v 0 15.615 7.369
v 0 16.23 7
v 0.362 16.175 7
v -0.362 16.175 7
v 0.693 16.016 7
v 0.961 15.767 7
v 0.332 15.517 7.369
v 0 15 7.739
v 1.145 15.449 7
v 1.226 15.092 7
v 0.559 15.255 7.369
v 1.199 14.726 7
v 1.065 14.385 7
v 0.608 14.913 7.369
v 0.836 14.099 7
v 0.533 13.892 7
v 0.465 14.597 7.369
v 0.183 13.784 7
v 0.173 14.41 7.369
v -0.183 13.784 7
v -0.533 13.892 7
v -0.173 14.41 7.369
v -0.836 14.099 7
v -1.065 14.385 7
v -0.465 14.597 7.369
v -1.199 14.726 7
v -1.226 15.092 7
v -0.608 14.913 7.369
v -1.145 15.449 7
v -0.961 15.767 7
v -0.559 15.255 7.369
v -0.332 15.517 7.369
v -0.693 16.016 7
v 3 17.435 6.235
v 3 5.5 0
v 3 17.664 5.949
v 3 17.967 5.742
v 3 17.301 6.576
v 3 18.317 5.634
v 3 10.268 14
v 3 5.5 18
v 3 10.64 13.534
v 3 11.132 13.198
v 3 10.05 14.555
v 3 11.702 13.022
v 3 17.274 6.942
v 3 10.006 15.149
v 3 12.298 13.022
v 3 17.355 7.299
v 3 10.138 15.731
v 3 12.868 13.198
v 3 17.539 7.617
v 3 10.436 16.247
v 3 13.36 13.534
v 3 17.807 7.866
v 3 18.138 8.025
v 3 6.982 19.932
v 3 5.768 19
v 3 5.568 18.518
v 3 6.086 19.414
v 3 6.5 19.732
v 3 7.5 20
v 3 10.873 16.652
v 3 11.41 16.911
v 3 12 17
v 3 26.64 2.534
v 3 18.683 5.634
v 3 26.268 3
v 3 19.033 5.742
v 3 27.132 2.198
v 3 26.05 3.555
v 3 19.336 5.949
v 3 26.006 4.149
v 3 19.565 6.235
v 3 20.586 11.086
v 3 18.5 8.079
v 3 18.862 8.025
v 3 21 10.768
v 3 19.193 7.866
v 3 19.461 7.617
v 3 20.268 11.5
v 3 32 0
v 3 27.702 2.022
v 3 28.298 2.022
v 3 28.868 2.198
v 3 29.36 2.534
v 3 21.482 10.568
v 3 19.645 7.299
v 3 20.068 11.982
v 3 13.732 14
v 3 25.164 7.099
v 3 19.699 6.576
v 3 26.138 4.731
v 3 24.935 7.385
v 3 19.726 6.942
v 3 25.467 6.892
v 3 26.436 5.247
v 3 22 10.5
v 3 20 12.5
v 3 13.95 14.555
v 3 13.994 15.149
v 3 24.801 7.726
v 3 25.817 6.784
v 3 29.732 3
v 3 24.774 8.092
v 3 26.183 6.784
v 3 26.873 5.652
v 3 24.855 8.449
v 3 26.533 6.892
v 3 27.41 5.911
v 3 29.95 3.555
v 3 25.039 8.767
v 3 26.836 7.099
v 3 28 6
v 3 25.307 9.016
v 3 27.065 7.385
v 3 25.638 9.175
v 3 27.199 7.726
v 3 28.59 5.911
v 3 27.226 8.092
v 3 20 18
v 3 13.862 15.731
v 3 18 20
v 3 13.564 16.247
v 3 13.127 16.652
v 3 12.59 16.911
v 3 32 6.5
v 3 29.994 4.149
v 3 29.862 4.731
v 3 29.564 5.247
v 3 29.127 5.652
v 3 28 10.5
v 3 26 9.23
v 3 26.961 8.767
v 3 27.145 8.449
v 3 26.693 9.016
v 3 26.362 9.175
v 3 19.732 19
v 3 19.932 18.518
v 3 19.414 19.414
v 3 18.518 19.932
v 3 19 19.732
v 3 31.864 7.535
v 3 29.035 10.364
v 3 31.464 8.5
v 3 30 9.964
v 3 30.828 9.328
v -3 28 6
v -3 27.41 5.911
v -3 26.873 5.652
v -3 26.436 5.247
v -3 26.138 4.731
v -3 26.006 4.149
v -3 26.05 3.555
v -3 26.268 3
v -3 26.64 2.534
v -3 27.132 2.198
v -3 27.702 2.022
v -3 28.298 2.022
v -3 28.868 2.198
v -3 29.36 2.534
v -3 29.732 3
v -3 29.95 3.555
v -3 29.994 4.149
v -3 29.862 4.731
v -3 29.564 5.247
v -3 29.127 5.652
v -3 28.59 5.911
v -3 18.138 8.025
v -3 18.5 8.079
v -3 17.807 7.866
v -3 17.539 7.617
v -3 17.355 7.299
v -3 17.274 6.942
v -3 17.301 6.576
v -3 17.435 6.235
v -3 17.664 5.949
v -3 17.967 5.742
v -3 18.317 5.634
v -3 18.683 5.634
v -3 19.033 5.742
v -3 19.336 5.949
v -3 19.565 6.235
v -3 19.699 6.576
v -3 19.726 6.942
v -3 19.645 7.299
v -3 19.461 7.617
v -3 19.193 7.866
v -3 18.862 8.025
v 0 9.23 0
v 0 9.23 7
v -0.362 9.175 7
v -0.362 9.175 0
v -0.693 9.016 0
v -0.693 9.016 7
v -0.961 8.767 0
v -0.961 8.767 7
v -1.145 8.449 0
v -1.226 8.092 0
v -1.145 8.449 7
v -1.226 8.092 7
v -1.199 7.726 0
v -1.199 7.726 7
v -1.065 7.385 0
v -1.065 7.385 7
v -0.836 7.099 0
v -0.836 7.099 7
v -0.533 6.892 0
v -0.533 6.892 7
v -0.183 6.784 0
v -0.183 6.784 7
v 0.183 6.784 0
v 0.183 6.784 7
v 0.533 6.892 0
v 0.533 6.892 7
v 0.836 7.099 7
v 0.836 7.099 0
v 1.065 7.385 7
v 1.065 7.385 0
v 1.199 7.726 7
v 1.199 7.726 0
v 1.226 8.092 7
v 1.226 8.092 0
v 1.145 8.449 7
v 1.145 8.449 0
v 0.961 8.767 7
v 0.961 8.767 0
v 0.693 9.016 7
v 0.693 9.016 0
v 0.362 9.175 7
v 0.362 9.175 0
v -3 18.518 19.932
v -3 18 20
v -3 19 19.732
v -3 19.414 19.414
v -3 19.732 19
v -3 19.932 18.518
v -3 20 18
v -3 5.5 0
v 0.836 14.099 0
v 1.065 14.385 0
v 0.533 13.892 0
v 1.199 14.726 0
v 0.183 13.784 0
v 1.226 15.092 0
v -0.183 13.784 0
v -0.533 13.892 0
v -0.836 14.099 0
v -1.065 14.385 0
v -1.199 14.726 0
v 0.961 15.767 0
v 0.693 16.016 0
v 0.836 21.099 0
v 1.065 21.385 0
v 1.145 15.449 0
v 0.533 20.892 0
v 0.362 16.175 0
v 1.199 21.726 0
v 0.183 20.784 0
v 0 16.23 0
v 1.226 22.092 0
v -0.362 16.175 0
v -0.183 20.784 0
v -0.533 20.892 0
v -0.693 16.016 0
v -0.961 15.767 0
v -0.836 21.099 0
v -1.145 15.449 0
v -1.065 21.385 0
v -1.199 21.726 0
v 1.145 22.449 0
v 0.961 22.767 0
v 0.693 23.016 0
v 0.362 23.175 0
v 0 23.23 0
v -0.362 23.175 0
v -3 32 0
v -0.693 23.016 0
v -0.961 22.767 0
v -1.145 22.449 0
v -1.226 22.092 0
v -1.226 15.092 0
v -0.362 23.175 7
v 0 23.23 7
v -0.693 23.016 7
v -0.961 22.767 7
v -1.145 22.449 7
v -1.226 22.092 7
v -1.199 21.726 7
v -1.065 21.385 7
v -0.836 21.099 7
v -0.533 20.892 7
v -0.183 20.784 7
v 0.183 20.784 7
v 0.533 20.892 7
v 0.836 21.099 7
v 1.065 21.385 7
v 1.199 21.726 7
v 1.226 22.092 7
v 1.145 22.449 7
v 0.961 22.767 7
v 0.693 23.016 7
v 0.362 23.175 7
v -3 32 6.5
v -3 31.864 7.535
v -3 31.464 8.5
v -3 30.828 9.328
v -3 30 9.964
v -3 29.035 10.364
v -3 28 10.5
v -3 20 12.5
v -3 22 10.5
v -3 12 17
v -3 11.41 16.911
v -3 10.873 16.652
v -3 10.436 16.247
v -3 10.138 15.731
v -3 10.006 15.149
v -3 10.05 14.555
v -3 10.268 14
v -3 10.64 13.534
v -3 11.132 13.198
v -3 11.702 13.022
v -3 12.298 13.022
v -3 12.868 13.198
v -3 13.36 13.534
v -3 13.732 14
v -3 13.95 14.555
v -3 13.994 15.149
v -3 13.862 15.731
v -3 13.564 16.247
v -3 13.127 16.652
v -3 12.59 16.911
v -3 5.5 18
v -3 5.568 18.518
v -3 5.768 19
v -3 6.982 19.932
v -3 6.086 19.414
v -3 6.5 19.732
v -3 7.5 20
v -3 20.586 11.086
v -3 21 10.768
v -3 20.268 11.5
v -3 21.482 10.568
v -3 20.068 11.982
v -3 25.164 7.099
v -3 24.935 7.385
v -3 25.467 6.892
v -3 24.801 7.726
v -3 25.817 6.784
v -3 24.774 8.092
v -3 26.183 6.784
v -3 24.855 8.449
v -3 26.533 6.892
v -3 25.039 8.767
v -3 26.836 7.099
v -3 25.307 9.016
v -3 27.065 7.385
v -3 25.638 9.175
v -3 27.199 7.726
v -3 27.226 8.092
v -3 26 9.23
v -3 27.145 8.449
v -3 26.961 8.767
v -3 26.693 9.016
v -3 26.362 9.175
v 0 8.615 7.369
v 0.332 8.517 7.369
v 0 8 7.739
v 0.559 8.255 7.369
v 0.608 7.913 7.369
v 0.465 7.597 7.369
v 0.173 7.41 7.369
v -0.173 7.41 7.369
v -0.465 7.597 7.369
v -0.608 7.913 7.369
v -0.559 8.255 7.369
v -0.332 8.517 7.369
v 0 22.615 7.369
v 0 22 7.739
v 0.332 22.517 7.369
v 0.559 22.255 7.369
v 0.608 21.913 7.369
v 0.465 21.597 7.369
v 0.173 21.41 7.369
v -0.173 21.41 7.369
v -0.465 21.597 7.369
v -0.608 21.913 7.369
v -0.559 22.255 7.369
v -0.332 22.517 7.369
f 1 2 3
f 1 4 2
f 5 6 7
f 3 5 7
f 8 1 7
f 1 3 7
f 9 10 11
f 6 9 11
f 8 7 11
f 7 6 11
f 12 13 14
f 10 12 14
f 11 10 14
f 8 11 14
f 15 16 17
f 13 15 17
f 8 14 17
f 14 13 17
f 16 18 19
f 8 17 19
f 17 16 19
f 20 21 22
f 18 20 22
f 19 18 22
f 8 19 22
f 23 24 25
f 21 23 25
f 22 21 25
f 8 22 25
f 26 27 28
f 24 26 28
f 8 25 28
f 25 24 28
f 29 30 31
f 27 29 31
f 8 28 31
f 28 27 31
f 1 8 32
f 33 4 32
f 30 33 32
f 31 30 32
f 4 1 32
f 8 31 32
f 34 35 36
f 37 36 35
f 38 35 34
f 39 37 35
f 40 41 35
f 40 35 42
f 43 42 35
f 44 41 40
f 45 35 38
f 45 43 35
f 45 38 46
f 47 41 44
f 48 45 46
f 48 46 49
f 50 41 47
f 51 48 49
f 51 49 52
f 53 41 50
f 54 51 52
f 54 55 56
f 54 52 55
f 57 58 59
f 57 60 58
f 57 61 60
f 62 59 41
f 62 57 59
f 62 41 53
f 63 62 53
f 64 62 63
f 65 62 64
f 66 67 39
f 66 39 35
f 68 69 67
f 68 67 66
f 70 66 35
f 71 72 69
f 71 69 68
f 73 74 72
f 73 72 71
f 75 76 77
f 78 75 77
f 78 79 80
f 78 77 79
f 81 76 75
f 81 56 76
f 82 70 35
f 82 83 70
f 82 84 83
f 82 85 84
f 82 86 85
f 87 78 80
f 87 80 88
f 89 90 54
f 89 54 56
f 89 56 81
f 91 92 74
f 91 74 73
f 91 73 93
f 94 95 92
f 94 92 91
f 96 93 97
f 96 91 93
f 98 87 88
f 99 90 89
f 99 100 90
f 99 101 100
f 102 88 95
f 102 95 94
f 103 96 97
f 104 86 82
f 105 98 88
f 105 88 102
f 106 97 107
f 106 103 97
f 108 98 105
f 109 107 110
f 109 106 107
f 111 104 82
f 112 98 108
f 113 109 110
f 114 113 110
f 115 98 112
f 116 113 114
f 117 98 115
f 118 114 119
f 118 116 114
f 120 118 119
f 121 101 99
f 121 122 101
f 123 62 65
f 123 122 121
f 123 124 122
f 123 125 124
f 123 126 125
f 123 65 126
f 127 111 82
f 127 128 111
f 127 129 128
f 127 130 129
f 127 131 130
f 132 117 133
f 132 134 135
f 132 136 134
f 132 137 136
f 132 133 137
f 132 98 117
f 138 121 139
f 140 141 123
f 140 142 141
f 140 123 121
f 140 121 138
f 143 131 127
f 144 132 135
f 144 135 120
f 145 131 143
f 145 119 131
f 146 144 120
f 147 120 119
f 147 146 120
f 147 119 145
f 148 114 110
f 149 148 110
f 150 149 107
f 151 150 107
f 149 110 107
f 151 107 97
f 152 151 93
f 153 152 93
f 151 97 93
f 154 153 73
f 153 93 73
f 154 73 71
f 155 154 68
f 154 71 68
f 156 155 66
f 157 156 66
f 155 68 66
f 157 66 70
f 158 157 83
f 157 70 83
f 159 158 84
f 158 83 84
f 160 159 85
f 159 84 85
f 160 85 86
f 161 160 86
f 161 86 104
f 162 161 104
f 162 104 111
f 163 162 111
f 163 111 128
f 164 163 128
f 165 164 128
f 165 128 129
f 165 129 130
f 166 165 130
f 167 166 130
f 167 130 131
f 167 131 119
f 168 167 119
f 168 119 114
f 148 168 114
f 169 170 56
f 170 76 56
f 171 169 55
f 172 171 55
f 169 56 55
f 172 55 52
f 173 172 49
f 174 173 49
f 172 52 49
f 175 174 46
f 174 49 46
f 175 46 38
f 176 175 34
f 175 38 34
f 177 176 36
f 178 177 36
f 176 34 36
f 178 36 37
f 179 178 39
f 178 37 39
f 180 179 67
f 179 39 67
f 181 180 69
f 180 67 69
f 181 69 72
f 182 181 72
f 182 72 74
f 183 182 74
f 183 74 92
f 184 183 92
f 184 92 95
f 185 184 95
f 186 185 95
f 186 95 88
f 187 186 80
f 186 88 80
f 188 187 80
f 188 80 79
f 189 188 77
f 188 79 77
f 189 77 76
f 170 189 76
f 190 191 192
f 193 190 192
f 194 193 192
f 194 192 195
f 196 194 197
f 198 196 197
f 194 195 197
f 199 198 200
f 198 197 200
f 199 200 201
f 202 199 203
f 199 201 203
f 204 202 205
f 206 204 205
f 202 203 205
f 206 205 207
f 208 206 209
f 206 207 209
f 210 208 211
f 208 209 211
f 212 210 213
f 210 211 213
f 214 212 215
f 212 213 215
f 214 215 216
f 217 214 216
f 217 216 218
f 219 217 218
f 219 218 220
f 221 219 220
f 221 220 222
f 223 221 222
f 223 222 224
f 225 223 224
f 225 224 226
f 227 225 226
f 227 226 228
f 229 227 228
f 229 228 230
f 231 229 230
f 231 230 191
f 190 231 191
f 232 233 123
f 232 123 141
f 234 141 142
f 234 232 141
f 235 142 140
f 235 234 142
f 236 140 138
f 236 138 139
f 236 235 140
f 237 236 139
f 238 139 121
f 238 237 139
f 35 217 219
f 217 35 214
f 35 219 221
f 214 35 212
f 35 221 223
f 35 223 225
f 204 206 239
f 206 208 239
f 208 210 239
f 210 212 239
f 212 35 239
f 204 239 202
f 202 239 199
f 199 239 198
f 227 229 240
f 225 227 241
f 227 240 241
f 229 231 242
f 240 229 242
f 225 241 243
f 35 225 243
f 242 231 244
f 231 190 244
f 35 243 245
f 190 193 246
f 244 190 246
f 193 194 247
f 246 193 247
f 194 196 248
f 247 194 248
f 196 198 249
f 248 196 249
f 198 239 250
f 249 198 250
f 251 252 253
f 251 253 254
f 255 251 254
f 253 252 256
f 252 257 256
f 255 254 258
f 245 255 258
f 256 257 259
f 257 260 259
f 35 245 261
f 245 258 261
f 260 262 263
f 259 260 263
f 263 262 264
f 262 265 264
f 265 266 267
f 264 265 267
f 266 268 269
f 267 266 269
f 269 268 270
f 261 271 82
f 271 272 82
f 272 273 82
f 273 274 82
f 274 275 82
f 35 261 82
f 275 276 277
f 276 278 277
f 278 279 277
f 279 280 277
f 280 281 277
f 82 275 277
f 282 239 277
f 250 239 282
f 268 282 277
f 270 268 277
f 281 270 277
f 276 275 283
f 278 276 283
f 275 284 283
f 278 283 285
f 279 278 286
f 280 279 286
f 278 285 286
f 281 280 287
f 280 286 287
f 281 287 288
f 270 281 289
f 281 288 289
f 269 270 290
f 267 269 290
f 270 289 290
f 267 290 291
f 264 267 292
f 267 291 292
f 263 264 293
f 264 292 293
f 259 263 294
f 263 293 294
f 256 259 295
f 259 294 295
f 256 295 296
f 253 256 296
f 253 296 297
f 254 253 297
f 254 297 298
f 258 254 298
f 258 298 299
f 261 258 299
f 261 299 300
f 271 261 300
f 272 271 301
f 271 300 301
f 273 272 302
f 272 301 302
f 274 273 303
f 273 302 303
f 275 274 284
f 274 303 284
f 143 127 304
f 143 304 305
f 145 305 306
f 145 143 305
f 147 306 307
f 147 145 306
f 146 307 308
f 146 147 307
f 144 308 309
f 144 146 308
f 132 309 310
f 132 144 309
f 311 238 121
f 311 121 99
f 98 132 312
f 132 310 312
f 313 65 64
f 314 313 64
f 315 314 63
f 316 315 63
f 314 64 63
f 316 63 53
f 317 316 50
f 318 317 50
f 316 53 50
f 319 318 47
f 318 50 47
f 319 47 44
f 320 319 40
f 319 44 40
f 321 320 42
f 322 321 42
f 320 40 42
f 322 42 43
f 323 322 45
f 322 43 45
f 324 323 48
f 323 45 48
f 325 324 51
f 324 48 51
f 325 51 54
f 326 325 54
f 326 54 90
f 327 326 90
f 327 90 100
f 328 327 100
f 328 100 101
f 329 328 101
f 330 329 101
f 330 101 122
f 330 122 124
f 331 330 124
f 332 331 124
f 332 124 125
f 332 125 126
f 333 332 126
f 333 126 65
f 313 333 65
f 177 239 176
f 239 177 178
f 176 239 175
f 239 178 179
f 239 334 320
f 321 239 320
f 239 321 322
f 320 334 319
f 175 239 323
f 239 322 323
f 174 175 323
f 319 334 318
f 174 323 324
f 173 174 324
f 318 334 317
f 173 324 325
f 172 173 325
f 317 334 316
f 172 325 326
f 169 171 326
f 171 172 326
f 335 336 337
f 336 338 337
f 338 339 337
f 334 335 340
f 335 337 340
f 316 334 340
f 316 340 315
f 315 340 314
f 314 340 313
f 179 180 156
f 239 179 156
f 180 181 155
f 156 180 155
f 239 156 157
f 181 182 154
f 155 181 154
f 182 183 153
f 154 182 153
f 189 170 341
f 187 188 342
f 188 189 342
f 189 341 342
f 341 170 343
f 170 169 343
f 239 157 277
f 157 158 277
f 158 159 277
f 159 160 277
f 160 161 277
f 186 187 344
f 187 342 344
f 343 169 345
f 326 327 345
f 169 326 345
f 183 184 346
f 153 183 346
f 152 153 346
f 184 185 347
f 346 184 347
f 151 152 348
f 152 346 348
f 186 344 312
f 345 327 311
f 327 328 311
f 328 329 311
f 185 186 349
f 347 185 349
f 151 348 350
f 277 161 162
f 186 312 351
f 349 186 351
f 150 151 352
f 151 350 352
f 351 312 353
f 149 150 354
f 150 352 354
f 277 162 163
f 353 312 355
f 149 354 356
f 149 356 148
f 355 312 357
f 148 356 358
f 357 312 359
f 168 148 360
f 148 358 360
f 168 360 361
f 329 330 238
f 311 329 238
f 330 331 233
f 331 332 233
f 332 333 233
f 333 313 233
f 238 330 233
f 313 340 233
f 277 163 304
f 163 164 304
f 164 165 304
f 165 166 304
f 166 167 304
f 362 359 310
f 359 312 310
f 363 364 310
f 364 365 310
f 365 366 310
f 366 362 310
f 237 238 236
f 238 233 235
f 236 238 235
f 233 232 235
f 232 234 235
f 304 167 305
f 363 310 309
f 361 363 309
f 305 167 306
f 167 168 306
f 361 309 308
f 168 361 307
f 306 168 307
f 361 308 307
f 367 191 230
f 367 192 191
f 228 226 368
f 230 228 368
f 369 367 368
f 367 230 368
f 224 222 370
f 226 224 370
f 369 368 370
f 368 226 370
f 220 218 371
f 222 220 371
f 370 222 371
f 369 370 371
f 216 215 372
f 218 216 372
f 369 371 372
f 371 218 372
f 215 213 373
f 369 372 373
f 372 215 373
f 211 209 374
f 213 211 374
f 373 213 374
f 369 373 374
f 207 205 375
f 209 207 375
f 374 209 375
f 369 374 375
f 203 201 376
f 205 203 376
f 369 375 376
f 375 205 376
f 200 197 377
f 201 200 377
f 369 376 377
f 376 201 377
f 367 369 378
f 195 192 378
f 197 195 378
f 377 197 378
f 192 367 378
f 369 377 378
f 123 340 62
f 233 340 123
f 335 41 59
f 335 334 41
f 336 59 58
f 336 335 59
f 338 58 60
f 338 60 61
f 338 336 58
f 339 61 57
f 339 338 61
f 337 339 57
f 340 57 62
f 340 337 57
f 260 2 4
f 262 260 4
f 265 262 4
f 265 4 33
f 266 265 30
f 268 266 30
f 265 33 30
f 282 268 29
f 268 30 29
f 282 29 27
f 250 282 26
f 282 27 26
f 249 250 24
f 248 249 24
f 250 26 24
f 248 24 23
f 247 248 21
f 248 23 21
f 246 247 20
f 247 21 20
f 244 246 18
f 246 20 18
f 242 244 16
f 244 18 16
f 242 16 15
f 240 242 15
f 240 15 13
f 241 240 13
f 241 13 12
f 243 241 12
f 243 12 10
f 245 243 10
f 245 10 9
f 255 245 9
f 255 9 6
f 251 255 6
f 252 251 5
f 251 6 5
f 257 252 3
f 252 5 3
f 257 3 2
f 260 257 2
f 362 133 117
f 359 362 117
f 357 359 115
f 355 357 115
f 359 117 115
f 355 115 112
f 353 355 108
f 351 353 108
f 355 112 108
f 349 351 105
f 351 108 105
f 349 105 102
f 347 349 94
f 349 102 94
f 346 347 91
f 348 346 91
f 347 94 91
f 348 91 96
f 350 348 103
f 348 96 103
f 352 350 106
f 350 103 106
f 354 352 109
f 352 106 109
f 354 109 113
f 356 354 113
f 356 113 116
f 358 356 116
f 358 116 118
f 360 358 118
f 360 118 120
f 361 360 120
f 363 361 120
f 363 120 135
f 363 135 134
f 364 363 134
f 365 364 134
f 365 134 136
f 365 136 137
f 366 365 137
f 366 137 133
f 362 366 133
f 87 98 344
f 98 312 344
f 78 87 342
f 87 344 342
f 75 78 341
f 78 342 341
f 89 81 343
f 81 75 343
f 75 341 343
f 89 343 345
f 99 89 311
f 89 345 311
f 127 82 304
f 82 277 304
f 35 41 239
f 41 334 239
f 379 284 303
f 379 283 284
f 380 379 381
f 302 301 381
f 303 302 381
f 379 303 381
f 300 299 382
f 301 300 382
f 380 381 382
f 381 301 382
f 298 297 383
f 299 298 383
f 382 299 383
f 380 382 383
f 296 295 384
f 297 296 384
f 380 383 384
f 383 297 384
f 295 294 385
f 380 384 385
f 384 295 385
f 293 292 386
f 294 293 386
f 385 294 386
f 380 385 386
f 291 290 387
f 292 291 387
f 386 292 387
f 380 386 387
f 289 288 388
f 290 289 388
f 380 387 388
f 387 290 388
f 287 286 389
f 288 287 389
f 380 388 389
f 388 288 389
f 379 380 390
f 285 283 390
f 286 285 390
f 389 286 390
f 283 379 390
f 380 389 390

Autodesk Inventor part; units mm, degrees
ref_plane "YZ Plane" through (0, 0, 0) normal (1, 0, 0) x (0, 1, 0)
ref_plane "XZ Plane" through (0, 0, 0) normal (0, 1, 0) x (-1, 0, 0)
ref_plane "XY Plane" through (0, 0, 0) normal (0, 0, 1) x (1, 0, 0)
sketch "Skizze1" plane through (0, 0, 0) normal (1, 0, 0) x (0, 1, 0)
  line L0 (5.5, 0) -> (32, 0)
  line L1 (32, 0) -> (32, 10.5)
  line L2 (5.5, 20) -> (5.5, 0)
  line L3 (5.5, 20) -> (20, 20)
  line L4 (20, 20) -> (20, 10.5)
  line L5 (32, 10.5) -> (20, 10.5)
  circle A0 centre (12, 15) radius 0.5
  circle A1 centre (28, 4) radius 0.5
  circle A2 centre (26, 8) radius 0.5
  line L6 (0, 24) -> (0, -4) projected
  line L7 (-6.4, 0) -> (38.4, 0) projected
  dimension "d1" = 10.5
  dimension "d3" = 20
  dimension "d21" = 1
  dimension "d28" = 1
  dimension "d31" = 4
  dimension "d41" = 1
  dimension "d43" = 8
  dimension "d54" = 5.5
  dimension "d55" = 26
  dimension "d56" = 28
  dimension "d61" = 15
  dimension "d62" = 12
  dimension "d127" = 32
  dimension "d128" = 14.5
extrude "Extrusion1" add sketch "Skizze1" along normal mid plane 6
sketch "Skizze9" plane through (-3, 0, 0) normal (-1, 0, 0) x (0, 0, 1)
  circle A0 centre (8, 26) radius 0.5 projected
  point P0 (0, 0)
hole "Feder" at (-3, 26, 8) direction (1, 0, 0) diameter 2.459 end through all thread size "M3x0.5" class "6H" standard "ISO Metric profile"
sketch "Skizze3" plane through (-3, 0, 0) normal (-1, 0, 0) x (0, 0, 1)
  circle A0 centre (4, 28) radius 0.5 projected
hole "Dribbler" at (-3, 28, 4) direction (1, 0, 0) diameter 4 end through all
sketch "Skizze4" plane through (-3, 0, 0) normal (-1, 0, 0) x (0, 0, 1)
  circle A0 centre (15, 12) radius 0.5 projected
  circle A1 centre (15, 12) radius 0.5 projected
  point P0 (0, 0)
hole "Chipper" at (-3, 12, 15) direction (1, 0, 0) diameter 4 end through all
sketch "Skizze5" plane through (3, 32, 0) normal (0, 0, -1) x (-1, 0, 0)
  line L0 (0, 0) -> (6, 0) projected
  line L1 (0, -26.5) -> (0, 0) projected
  line L2 (6, -26.5) -> (0, -26.5) projected
  line L3 (6, 0) -> (6, -26.5) projected
  line L4 (3, -26.5) -> (3, 0) construction
  point P0 (3, -10)
  point P1 (3, -24)
  point P2 (3, -17)
  point P3 (3, -13.25)
  dimension "d58" = 7
  dimension "d89" = 7
  dimension "d97" = 2.5
hole "Montage" at (0, 22, 0) at (0, 8, 0) at (0, 15, 0) direction (0, 0, 1) diameter 2.459 depth 7 tip angle 118 thread size "M3x0.5" class "6H" standard "ISO Metric profile"
fillet "Rundung2" radius 2 3 edges at (0, 5.5, 20) (0, 20, 20) (0, 20, 10.5)
fillet "Rundung3" radius 4 1 edges at (0, 32, 10.5)
sketch "Skizze6" plane through (-3, 0, 0) normal (-1, 0, 0) x (0, 0, 1)
  line L0 (0, 13.7705) -> (0, 16.2295) projected
  line L1 (7, 16.2295) -> (7, 13.7705) projected
  line L2 (0, 20.7705) -> (0, 23.2295) projected
  line L3 (7, 23.2295) -> (7, 20.7705) projected
  circle A0 centre (15, 12) radius 2 projected
  line L4 (7, 13.7705) -> (7, 23.2295) construction
  line L5 (7, 13.7705) -> (0, 13.7705) construction
  line L6 (0, 23.2295) -> (0, 13.7705) construction
  line L7 (0, 5.5) -> (0, 32) construction
  line L8 (7, 18.5) -> (0, 18.5) construction
  line L9 (15, 12) -> (15, 7) construction
  line L10 (0, 6.7705) -> (0, 9.2295) projected
  line L11 (7, 9.2295) -> (7, 6.7705) projected
  line L12 (7, 6.7705) -> (7, 16.2295) construction
  line L13 (7, 6.7705) -> (0, 6.7705) construction
  line L14 (0, 6.7705) -> (0, 16.2295) construction
  line L15 (7, 11.5) -> (0, 11.5) construction
  point P0 (0, 0)
  point P1 (3.5, 11.5)
  point P2 (3.5, 18.5)
  point P3 (7.7388, 8)
  point P4 (3.5, 11.5)
  dimension "d71" = 5
hole "Bohrung4" [suppressed]
sketch "Skizze8" plane through (-3, 0, 0) normal (-1, 0, 0) x (0, 0, 1)
  line L0 (21, 16) -> (21, 9) construction
  line L1 (-4.2, 0) -> (25.2, 0) projected
  line L2 (0, 38.4) -> (0, -6.4) projected
  point P0 (0, 0)
  dimension "d72" = 7
  dimension "d73" = 9
  dimension "d74" = 21
hole "Bohrung5" [suppressed]
sketch "Skizze10" plane through (-3, 0, 0) normal (-1, 0, 0) x (0, 0, 1)
  line L0 (0, 13.7705) -> (0, 16.2295) projected
  line L1 (7, 16.2295) -> (7, 13.7705) projected
  line L2 (0, 6.7705) -> (0, 9.2295) projected
  line L3 (7, 9.2295) -> (7, 6.7705) projected
  line L4 (-4, 0) -> (24, 0) projected
  line L5 (0, 38.4) -> (0, -6.4) projected
  point P0 (0, 0)
  point P1 (6.85, 18.5)
  dimension "d98" = 18.5
  dimension "d99" = 6.85
hole "Alternativer Anschlag" at (-3, 18.5, 6.85) direction (1, 0, 0) diameter 2.459 end through all thread size "M3x0.5" class "6H" standard "ISO Metric profile"
properties part number "Dribbler Lagerbock" material "Aluminium 6061"
